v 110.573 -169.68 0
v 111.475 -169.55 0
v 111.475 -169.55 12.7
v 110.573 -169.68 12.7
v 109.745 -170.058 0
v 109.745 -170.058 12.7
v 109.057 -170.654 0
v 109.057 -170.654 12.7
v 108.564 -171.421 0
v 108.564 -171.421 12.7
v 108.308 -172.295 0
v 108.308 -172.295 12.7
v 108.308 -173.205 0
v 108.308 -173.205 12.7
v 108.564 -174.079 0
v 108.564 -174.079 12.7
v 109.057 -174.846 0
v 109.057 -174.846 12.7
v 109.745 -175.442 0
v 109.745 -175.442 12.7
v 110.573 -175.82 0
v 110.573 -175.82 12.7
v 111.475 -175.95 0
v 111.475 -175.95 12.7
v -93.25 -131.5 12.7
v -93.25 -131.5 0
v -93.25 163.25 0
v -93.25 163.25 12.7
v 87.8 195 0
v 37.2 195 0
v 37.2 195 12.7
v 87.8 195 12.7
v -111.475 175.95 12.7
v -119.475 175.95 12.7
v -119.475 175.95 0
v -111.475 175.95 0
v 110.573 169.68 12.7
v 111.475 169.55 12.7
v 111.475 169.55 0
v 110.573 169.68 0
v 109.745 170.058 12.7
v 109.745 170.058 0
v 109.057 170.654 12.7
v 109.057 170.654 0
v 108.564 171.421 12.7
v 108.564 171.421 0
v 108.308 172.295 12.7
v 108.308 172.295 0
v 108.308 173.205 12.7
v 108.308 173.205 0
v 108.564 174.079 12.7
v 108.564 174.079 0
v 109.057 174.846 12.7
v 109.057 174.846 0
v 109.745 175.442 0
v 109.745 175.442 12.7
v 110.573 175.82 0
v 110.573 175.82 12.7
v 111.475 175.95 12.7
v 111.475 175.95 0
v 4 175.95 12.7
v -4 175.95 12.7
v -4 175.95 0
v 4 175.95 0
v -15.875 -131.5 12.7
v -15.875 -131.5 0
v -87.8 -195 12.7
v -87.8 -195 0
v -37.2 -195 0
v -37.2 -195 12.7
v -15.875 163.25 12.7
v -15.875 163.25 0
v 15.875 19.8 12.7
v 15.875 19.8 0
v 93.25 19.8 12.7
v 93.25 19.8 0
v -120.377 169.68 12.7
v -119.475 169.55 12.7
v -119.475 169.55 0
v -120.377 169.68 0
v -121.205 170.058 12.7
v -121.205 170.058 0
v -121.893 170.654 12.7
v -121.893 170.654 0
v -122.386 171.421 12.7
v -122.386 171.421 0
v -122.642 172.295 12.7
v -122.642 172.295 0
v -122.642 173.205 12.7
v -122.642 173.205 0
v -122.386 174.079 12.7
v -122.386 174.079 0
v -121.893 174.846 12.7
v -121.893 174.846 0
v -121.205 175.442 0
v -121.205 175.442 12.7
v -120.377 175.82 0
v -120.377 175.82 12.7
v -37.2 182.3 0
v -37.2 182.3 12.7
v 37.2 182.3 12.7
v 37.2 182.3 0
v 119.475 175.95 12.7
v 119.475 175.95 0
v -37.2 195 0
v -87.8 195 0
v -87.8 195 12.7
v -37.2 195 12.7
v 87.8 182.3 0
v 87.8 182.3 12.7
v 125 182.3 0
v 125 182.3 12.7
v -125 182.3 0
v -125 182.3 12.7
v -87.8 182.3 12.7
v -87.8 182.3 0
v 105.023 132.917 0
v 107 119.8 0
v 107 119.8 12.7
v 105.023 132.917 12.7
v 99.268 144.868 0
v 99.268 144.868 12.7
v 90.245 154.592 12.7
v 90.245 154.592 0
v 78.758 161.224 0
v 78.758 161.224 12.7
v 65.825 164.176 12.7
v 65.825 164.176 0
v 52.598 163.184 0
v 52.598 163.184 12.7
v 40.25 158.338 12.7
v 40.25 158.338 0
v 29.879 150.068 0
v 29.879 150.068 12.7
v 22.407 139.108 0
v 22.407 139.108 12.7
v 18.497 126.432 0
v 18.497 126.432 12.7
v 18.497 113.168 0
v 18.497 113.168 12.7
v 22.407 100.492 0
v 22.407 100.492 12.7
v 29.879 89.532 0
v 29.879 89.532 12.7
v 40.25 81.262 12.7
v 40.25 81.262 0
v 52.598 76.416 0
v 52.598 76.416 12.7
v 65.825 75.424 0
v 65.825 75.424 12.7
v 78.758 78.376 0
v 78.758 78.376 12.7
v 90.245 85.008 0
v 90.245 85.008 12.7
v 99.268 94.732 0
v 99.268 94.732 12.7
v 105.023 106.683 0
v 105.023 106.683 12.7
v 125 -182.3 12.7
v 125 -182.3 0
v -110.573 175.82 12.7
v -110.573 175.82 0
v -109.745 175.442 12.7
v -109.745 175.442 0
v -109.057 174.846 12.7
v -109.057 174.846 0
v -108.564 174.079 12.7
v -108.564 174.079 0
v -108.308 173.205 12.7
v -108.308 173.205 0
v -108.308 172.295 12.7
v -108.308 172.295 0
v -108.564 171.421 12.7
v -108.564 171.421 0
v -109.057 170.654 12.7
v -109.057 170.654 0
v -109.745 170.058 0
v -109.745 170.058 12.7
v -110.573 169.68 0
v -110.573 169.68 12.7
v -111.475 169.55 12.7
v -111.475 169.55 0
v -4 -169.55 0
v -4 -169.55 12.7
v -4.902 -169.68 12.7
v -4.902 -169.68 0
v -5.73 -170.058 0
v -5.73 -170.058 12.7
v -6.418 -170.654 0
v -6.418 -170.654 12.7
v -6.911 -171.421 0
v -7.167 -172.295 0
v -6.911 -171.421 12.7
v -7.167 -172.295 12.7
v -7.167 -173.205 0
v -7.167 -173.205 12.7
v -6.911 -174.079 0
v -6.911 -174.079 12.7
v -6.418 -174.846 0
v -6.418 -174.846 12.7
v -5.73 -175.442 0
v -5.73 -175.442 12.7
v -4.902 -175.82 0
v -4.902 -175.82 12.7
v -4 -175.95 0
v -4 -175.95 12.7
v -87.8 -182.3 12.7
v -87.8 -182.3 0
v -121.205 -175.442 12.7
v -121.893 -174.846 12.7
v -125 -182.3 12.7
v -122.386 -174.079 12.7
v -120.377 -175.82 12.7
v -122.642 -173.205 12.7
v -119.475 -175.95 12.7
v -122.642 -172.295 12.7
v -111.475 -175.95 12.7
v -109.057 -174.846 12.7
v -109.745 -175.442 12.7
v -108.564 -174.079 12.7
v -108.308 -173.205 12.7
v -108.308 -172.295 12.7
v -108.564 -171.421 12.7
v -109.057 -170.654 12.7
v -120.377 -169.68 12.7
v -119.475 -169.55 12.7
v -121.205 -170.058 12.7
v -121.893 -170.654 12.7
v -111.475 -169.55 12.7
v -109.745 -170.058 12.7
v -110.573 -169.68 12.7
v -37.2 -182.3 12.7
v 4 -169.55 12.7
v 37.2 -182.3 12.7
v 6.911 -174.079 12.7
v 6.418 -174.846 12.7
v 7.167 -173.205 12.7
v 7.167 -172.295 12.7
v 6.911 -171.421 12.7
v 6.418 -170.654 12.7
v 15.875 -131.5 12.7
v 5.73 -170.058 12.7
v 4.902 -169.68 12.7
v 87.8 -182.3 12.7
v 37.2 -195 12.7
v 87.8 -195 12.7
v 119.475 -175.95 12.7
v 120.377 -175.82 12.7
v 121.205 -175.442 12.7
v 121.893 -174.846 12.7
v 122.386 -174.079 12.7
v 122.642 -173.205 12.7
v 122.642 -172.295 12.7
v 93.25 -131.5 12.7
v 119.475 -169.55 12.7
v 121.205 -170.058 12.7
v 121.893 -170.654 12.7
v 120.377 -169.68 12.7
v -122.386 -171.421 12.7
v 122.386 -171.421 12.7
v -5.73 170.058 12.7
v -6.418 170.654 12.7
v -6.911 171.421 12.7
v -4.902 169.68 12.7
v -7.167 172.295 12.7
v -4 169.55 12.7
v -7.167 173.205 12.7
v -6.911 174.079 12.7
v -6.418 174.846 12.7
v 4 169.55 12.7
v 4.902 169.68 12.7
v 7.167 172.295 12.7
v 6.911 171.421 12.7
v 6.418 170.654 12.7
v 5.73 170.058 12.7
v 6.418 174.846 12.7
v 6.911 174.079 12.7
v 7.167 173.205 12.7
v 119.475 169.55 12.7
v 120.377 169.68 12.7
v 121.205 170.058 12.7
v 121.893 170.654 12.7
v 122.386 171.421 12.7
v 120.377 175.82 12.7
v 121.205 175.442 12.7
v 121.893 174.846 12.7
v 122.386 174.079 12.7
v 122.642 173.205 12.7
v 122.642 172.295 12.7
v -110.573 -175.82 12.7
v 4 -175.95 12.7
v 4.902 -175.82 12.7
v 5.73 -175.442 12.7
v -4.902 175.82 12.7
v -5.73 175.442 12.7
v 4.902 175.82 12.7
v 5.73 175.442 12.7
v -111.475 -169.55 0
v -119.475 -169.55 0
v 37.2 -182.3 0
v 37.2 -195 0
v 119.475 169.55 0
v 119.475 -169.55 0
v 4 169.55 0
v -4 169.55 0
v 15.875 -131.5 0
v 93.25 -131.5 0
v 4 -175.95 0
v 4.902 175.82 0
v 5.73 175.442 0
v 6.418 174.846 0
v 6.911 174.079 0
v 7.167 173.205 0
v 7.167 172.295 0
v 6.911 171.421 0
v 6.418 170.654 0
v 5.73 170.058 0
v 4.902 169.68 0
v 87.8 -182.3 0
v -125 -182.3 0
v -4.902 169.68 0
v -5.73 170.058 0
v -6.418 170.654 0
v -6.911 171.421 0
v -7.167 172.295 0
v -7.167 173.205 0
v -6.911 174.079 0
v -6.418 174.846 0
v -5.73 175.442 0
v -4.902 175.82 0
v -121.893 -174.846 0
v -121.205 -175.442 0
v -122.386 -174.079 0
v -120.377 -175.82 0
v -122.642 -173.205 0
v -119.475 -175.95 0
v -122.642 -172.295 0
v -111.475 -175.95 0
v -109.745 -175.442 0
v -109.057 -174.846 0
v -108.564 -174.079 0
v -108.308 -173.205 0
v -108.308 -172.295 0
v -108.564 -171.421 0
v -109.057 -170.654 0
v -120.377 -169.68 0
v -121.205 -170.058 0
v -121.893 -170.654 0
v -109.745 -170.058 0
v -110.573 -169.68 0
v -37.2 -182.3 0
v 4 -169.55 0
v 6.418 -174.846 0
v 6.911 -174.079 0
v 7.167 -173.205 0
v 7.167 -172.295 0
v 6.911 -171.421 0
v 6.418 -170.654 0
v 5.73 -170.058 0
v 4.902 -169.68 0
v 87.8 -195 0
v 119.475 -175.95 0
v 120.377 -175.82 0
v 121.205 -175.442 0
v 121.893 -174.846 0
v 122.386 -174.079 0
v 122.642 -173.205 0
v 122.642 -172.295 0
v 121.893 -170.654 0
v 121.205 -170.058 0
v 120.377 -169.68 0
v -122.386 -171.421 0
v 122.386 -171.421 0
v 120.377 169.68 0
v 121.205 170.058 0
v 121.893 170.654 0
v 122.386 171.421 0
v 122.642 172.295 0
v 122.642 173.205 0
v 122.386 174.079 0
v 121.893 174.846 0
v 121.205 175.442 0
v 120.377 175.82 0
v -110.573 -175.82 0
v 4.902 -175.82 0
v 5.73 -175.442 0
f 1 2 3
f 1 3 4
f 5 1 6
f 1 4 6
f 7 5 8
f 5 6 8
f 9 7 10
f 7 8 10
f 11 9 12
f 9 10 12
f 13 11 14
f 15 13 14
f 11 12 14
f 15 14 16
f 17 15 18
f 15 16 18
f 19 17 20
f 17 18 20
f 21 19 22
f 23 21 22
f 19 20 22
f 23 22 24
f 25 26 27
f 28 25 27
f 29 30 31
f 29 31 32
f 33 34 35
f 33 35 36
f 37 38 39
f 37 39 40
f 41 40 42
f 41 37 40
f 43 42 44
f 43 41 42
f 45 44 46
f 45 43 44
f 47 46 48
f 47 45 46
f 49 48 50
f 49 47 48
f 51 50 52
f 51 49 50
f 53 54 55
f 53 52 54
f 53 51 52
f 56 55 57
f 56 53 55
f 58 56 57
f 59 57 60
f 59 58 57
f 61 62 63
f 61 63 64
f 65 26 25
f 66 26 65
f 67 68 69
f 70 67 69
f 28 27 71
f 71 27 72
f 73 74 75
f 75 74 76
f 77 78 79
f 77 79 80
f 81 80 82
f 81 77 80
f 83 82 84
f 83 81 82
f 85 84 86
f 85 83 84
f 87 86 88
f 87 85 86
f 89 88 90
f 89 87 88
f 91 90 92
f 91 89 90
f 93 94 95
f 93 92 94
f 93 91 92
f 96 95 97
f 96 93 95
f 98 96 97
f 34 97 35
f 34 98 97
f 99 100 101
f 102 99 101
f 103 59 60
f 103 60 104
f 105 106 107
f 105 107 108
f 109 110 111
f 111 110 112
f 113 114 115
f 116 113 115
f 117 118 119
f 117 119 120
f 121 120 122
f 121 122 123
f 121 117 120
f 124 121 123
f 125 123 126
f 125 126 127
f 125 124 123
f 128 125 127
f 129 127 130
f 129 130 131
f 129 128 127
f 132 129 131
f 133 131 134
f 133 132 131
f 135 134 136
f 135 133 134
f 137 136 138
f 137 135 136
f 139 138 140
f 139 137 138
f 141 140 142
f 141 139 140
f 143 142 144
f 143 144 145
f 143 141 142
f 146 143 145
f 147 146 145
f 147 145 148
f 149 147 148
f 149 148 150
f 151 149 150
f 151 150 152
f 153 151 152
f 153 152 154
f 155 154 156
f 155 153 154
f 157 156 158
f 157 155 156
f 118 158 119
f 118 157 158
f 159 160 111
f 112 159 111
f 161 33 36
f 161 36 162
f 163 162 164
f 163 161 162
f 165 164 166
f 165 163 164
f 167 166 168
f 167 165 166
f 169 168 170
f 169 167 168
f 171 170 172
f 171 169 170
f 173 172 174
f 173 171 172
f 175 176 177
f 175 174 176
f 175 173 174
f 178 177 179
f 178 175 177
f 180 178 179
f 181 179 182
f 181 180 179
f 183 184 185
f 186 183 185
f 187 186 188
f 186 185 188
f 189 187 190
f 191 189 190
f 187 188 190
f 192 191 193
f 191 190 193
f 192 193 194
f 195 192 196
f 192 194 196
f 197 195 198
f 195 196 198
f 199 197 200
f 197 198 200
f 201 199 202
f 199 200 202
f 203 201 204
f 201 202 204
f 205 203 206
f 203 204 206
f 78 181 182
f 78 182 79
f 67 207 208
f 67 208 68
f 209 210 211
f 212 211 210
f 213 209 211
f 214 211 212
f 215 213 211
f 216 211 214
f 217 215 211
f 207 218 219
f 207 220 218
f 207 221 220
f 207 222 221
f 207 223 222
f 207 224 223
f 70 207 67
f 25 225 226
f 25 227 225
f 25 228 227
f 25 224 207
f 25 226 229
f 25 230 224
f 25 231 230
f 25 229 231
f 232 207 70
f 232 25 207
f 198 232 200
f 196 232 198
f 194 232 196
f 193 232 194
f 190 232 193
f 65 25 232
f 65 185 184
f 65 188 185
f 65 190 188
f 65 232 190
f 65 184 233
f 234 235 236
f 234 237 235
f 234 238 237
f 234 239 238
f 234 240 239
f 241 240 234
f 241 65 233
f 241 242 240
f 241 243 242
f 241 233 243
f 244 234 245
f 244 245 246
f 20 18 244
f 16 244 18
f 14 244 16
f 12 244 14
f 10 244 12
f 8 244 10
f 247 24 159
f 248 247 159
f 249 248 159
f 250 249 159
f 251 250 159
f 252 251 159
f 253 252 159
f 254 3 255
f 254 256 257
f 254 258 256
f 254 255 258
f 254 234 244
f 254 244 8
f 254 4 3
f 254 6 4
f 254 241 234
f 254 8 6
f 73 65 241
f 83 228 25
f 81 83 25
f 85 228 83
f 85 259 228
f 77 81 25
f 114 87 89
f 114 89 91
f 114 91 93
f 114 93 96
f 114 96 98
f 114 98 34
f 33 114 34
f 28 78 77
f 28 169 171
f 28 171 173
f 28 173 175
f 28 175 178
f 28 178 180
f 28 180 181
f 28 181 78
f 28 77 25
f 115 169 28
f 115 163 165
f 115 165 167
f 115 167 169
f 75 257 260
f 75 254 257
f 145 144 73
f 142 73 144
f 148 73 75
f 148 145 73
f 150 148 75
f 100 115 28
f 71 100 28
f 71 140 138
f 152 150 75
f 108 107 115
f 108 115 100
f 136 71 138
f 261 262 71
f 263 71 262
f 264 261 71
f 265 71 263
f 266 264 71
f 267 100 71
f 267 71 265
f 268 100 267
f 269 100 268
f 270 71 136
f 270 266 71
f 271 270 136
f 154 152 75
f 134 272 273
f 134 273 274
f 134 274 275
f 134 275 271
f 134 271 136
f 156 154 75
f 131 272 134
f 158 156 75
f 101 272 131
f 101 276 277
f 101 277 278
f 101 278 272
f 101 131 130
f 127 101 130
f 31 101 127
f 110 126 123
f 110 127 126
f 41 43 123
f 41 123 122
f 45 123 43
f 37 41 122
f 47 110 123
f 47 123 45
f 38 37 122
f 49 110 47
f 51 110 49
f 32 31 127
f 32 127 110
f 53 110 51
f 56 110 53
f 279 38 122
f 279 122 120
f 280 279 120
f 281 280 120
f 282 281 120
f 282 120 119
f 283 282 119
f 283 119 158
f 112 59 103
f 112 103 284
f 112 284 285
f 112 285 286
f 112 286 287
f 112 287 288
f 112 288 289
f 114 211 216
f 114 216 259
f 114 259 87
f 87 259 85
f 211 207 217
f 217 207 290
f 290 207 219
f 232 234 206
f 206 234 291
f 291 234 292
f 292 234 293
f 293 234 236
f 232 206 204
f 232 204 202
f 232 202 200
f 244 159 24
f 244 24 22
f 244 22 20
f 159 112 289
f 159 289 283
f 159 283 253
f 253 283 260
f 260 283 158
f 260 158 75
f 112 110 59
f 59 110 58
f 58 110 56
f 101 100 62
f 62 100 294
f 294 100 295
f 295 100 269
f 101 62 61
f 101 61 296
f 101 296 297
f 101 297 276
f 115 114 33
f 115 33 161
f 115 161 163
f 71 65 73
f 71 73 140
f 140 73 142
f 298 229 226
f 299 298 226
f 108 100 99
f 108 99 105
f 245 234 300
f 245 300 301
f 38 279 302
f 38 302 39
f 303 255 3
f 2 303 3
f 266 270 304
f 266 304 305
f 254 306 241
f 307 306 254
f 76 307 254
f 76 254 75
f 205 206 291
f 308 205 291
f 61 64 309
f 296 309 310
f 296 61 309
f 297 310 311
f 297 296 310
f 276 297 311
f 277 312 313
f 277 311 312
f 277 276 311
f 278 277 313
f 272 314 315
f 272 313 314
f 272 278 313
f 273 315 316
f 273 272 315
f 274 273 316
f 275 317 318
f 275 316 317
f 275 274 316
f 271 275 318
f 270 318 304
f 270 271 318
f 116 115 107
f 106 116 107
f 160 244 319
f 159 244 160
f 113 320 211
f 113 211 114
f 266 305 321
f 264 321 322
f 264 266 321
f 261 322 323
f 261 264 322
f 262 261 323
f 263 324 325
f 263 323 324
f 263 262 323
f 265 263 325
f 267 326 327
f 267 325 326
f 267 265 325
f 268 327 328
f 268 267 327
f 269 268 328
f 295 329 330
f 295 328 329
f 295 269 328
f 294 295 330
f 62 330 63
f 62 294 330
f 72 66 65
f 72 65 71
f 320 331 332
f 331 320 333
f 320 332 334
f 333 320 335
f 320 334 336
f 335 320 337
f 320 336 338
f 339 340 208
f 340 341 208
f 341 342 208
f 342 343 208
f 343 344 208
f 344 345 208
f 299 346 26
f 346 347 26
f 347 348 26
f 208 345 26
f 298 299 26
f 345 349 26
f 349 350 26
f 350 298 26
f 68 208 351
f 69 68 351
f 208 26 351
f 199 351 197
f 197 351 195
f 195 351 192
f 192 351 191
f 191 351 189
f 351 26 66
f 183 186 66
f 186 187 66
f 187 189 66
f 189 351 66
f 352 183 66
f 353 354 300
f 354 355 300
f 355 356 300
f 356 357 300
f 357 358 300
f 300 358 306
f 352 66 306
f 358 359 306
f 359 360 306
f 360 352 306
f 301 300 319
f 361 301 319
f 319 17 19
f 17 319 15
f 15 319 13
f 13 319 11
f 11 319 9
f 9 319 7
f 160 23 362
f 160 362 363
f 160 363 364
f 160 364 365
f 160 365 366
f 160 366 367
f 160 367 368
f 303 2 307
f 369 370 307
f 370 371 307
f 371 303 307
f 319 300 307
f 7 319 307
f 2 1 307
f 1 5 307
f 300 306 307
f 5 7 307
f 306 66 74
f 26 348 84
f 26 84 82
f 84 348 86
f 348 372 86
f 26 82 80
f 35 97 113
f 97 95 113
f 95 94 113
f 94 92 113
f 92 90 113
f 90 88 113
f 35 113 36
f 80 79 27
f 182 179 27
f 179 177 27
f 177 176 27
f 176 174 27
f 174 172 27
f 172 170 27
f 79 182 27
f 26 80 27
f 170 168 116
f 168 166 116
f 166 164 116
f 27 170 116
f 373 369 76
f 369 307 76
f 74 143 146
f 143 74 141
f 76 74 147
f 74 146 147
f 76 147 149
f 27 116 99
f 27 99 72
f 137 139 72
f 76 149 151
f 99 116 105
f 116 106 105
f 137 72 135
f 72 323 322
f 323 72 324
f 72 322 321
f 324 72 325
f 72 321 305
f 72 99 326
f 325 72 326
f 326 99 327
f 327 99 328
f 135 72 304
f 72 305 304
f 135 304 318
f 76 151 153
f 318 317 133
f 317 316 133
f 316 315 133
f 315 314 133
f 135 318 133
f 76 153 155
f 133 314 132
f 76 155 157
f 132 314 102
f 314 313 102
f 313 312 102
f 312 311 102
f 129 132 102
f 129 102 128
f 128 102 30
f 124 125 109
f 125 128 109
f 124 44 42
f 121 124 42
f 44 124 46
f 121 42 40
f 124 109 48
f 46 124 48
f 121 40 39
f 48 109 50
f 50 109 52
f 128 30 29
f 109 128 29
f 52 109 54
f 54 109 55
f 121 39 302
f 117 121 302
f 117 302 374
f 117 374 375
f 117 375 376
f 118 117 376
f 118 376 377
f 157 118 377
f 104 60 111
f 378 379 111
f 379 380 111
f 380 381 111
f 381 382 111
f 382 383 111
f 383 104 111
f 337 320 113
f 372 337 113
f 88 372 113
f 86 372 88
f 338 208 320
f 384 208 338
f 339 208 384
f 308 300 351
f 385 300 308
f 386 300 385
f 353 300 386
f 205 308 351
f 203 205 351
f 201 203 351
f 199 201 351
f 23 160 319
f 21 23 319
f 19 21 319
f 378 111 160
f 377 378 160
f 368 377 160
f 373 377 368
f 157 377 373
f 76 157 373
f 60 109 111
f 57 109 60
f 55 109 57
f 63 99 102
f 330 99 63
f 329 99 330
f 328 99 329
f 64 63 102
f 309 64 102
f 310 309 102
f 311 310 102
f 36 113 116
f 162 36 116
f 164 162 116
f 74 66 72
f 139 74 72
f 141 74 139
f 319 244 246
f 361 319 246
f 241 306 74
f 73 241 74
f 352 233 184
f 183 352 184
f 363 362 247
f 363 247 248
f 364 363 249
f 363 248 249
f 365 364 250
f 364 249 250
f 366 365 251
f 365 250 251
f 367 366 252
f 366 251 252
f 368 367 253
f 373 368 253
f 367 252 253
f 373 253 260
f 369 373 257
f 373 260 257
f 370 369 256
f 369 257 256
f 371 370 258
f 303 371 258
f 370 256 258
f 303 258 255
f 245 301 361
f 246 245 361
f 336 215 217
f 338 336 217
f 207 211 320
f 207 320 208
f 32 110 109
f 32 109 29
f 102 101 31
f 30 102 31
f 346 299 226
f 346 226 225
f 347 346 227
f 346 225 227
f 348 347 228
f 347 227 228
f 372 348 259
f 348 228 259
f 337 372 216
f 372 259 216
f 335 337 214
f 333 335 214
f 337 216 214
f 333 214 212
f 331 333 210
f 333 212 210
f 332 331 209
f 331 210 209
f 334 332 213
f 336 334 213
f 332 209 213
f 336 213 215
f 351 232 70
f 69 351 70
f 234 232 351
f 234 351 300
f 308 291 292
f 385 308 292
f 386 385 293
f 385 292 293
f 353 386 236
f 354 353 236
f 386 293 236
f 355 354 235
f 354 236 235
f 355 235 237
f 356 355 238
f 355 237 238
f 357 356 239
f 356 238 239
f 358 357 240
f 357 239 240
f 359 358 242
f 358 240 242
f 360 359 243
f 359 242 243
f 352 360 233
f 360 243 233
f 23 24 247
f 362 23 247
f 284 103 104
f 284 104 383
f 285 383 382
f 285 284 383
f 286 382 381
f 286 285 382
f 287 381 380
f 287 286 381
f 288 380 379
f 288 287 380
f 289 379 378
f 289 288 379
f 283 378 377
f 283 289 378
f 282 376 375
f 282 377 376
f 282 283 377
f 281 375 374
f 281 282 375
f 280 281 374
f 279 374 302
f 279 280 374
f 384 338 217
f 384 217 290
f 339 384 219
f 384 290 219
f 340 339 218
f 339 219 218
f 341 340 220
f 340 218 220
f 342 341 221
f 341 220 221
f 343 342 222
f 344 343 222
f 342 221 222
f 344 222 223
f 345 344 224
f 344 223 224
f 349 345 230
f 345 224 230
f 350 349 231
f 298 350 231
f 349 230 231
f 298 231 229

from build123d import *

# Parameters (mm, degrees)
CROQUIS1_W              = 250
CROQUIS1_H              = 390
CROQUIS1_R              = 44.5
CROQUIS1_W_2            = 77.375
CROQUIS1_H_2            = 294.75
CROQUIS1_H_3            = 151.3
SALIENTE_EXTRUIR1_DEPTH = 12.7
CROQUIS2_W              = 37.2
CROQUIS2_H              = 12.7
CROQUIS2_W_2            = 74.4
CORTAR_EXTRUIR1_DEPTH   = 13.7


with BuildPart() as part:
    # Croquis1 → Saliente-Extruir1 (new body)
    with BuildSketch(Plane.XY):
        Rectangle(CROQUIS1_W, CROQUIS1_H)
        with Locations((62.5, 119.8)):
            Circle(CROQUIS1_R, mode=Mode.SUBTRACT)
        with Locations((-54.5625, 15.875)):
            Rectangle(CROQUIS1_W_2, CROQUIS1_H_2, mode=Mode.SUBTRACT)
        with Locations((54.5625, -55.85)):
            Rectangle(CROQUIS1_W_2, CROQUIS1_H_3, mode=Mode.SUBTRACT)
    extrude(amount=SALIENTE_EXTRUIR1_DEPTH)

    # Croquis2 → Cortar-Extruir1 (cut, through all)
    with BuildSketch(Plane.XY.offset(12.7)):
        with Locations((-106.4, 188.65)):
            Rectangle(CROQUIS2_W, CROQUIS2_H)
        with Locations((0, 188.65)):
            Rectangle(CROQUIS2_W_2, CROQUIS2_H)
        with Locations((106.4, 188.65)):
            Rectangle(CROQUIS2_W, CROQUIS2_H)
        with BuildLine():
            Line((-119.475, 175.95), (-111.475, 175.95))
            ThreePointArc((-111.475, 175.95), (-108.275, 172.75), (-111.475, 169.55))
            Line((-111.475, 169.55), (-119.475, 169.55))
            ThreePointArc((-119.475, 169.55), (-122.675, 172.75), (-119.475, 175.95))
        make_face()
        with BuildLine():
            Line((-4, 175.95), (4, 175.95))
            ThreePointArc((4, 175.95), (7.2, 172.75), (4, 169.55))
            Line((4, 169.55), (-4, 169.55))
            ThreePointArc((-4, 169.55), (-7.2, 172.75), (-4, 175.95))
        make_face()
        with BuildLine():
            Line((111.475, 175.95), (119.475, 175.95))
            ThreePointArc((119.475, 175.95), (122.675, 172.75), (119.475, 169.55))
            Line((119.475, 169.55), (111.475, 169.55))
            ThreePointArc((111.475, 169.55), (108.275, 172.75), (111.475, 175.95))
        make_face()
    cortar_extruir1 = extrude(amount=-CORTAR_EXTRUIR1_DEPTH, mode=Mode.SUBTRACT)

    # Simetría1: Cortar-Extruir1 across plane
    add(cortar_extruir1.mirror(Plane.ZX), mode=Mode.SUBTRACT)


solid = part.part
